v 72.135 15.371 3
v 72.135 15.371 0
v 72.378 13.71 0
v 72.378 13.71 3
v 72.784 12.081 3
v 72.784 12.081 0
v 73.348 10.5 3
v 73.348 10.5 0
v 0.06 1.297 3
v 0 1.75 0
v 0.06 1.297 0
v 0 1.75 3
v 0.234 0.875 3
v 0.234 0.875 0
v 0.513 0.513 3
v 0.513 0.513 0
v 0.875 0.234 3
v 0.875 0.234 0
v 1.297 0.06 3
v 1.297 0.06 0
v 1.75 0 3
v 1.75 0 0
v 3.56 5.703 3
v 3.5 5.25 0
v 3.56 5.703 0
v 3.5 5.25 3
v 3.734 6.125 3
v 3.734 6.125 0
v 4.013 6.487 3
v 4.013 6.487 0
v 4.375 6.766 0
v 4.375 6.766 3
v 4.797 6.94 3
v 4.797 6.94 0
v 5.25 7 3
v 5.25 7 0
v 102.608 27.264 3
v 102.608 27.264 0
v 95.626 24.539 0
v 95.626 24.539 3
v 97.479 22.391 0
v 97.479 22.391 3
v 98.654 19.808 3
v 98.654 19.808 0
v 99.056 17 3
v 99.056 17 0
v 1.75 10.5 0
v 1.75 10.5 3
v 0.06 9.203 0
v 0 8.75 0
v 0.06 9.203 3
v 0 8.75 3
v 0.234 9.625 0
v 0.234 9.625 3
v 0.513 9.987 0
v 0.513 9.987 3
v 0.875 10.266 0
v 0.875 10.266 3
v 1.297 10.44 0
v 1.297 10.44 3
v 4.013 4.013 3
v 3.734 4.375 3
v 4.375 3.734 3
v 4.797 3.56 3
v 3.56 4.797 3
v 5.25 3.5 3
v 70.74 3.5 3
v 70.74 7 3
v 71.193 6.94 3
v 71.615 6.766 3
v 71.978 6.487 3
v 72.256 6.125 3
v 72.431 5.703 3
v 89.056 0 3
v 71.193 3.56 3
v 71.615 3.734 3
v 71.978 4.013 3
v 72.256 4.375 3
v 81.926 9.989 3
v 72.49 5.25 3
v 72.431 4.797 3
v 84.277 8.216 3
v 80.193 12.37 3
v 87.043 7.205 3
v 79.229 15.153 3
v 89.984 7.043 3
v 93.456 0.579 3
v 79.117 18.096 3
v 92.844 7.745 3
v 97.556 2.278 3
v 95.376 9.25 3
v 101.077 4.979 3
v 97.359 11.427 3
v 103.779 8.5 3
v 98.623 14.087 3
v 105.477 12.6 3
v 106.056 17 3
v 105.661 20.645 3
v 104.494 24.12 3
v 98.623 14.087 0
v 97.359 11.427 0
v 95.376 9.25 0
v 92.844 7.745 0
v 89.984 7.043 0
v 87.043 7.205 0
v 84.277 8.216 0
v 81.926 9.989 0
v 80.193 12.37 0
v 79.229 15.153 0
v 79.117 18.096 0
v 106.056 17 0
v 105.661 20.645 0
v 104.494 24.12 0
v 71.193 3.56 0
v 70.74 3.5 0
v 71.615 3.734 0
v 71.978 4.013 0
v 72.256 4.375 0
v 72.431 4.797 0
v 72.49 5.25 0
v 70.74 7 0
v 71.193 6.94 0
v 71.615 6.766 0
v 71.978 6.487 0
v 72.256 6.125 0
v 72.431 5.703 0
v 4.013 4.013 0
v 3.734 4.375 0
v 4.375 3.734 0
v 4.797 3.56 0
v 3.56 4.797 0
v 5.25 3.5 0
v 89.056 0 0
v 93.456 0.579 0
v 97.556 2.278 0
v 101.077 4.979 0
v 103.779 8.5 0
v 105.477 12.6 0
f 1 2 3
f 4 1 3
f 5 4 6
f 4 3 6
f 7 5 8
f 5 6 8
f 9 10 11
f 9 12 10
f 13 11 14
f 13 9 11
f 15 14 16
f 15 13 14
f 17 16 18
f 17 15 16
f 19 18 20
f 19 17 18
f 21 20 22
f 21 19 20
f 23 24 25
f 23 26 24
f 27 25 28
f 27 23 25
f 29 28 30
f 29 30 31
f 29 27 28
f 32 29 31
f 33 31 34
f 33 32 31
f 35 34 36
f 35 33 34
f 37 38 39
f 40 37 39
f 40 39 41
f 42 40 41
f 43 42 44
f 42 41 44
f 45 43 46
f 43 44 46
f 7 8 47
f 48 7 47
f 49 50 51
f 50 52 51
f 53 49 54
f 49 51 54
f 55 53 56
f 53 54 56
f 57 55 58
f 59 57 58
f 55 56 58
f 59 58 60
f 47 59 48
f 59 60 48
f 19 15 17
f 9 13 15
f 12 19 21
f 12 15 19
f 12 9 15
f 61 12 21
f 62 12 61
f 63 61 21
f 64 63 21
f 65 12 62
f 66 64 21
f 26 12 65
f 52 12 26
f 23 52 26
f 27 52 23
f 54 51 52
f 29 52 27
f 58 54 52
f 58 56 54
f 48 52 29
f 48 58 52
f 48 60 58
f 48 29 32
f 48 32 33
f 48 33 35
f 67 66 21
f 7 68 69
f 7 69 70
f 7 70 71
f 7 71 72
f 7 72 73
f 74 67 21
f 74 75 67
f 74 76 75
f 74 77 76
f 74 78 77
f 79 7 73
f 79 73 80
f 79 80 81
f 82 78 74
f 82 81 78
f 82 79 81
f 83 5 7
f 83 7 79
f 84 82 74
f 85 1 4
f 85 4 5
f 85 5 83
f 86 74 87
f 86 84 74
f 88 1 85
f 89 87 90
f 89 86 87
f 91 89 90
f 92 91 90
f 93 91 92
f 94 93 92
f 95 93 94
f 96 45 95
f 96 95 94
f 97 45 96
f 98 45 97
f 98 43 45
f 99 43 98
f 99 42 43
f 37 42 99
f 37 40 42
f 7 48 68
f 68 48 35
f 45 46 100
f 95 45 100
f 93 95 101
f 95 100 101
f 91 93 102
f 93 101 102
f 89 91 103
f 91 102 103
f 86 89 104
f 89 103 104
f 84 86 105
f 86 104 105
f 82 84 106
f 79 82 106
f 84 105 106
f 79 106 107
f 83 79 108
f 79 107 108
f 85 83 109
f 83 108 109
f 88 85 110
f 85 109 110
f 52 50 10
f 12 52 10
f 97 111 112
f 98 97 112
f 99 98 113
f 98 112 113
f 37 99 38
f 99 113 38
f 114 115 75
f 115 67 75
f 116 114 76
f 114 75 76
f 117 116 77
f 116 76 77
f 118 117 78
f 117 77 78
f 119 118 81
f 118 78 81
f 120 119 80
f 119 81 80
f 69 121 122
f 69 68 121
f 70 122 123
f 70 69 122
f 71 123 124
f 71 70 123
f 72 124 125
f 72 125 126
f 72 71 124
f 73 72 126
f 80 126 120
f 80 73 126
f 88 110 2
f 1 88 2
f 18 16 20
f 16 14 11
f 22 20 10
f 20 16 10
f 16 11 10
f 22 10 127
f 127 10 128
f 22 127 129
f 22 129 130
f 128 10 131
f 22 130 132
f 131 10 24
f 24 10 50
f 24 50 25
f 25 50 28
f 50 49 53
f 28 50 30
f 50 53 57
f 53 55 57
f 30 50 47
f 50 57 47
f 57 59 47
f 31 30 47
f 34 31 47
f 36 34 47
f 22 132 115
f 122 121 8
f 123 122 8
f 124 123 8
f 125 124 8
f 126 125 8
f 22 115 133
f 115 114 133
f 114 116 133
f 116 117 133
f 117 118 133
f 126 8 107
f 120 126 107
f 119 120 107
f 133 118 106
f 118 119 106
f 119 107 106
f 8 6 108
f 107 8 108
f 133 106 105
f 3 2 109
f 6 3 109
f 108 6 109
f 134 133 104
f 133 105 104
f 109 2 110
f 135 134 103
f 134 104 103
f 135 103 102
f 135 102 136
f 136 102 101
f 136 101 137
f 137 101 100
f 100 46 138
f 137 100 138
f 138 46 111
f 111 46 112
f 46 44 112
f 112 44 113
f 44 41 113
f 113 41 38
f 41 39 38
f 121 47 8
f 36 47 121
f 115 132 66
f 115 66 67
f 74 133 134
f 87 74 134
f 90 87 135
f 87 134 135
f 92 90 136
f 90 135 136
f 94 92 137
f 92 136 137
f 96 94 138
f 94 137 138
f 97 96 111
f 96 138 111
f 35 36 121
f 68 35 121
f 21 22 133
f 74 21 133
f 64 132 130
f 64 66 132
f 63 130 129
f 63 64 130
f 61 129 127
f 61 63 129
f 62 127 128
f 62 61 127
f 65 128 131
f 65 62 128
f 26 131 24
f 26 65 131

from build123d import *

# Parameters (mm, degrees)
F1_W     = 68.9904686213
F1_H     = 3.5
F2_DEPTH = 3
F3_R     = 1.74999


# Not quite as in the source:
# - a fillet or chamfer is up to 0.001 mm smaller than in the source, because OpenCascade refuses the exact size


with BuildPart() as f2:
    # F1 (on Top) → F2 (new body)
    with BuildSketch(Plane.XY):
        with BuildLine():
            Line((0, 10.5), (0, 0))
            Line((0, 0), (89.0564994759, 0))
            ThreePointArc((89.0564994759, 0), (79.609277662, 2.8667059749), (73.3482214035, 10.5))
            Line((73.3482214035, 10.5), (59.6541650593, 10.5))
            Line((59.6541650593, 10.5), (0, 10.5))
        make_face()
        with Locations((37.9952343106, 5.25)):
            Rectangle(F1_W, F1_H, mode=Mode.SUBTRACT)
        with BuildLine():
            ThreePointArc((73.3482214035, 10.5), (79.609277662, 2.8667059749), (89.0564994759, 0))
            ThreePointArc((89.0564994759, 0), (101.0773147561, 4.9791847198), (106.0564994759, 17))
            ThreePointArc((106.0564994759, 17), (105.1713324233, 22.414070472), (102.6080101728, 27.2643342614))
            Line((102.6080101728, 27.2643342614), (95.6259965732, 24.5393439959))
            ThreePointArc((95.6259965732, 24.5393439959), (98.158558885, 21.1415594301), (99.0564994759, 17))
            ThreePointArc((99.0564994759, 17), (88.5076755448, 7.0150717432), (79.1167410173, 18.0959935155))
            Line((79.1167410173, 18.0959935155), (72.1347274177, 15.37100325))
            ThreePointArc((72.1347274177, 15.37100325), (72.5606905825, 12.8904636571), (73.3482214035, 10.5))
        make_face()
    extrude(amount=F2_DEPTH)

    # F3 (radius 1.75 in the source; OpenCascade refuses exactly that, so slightly less here)
    f3_edges = [f2.edges().sort_by_distance(p)[0] for p in [
        (3.5, 7, 1.5),
        (3.5, 3.5, 1.5),
        (0, 10.5, 1.5),
        (0, 0, 1.5),
        (72.490469, 7, 1.5),
        (72.490469, 3.5, 1.5),
    ]]
    fillet(f3_edges, radius=F3_R)


solid = f2.part
